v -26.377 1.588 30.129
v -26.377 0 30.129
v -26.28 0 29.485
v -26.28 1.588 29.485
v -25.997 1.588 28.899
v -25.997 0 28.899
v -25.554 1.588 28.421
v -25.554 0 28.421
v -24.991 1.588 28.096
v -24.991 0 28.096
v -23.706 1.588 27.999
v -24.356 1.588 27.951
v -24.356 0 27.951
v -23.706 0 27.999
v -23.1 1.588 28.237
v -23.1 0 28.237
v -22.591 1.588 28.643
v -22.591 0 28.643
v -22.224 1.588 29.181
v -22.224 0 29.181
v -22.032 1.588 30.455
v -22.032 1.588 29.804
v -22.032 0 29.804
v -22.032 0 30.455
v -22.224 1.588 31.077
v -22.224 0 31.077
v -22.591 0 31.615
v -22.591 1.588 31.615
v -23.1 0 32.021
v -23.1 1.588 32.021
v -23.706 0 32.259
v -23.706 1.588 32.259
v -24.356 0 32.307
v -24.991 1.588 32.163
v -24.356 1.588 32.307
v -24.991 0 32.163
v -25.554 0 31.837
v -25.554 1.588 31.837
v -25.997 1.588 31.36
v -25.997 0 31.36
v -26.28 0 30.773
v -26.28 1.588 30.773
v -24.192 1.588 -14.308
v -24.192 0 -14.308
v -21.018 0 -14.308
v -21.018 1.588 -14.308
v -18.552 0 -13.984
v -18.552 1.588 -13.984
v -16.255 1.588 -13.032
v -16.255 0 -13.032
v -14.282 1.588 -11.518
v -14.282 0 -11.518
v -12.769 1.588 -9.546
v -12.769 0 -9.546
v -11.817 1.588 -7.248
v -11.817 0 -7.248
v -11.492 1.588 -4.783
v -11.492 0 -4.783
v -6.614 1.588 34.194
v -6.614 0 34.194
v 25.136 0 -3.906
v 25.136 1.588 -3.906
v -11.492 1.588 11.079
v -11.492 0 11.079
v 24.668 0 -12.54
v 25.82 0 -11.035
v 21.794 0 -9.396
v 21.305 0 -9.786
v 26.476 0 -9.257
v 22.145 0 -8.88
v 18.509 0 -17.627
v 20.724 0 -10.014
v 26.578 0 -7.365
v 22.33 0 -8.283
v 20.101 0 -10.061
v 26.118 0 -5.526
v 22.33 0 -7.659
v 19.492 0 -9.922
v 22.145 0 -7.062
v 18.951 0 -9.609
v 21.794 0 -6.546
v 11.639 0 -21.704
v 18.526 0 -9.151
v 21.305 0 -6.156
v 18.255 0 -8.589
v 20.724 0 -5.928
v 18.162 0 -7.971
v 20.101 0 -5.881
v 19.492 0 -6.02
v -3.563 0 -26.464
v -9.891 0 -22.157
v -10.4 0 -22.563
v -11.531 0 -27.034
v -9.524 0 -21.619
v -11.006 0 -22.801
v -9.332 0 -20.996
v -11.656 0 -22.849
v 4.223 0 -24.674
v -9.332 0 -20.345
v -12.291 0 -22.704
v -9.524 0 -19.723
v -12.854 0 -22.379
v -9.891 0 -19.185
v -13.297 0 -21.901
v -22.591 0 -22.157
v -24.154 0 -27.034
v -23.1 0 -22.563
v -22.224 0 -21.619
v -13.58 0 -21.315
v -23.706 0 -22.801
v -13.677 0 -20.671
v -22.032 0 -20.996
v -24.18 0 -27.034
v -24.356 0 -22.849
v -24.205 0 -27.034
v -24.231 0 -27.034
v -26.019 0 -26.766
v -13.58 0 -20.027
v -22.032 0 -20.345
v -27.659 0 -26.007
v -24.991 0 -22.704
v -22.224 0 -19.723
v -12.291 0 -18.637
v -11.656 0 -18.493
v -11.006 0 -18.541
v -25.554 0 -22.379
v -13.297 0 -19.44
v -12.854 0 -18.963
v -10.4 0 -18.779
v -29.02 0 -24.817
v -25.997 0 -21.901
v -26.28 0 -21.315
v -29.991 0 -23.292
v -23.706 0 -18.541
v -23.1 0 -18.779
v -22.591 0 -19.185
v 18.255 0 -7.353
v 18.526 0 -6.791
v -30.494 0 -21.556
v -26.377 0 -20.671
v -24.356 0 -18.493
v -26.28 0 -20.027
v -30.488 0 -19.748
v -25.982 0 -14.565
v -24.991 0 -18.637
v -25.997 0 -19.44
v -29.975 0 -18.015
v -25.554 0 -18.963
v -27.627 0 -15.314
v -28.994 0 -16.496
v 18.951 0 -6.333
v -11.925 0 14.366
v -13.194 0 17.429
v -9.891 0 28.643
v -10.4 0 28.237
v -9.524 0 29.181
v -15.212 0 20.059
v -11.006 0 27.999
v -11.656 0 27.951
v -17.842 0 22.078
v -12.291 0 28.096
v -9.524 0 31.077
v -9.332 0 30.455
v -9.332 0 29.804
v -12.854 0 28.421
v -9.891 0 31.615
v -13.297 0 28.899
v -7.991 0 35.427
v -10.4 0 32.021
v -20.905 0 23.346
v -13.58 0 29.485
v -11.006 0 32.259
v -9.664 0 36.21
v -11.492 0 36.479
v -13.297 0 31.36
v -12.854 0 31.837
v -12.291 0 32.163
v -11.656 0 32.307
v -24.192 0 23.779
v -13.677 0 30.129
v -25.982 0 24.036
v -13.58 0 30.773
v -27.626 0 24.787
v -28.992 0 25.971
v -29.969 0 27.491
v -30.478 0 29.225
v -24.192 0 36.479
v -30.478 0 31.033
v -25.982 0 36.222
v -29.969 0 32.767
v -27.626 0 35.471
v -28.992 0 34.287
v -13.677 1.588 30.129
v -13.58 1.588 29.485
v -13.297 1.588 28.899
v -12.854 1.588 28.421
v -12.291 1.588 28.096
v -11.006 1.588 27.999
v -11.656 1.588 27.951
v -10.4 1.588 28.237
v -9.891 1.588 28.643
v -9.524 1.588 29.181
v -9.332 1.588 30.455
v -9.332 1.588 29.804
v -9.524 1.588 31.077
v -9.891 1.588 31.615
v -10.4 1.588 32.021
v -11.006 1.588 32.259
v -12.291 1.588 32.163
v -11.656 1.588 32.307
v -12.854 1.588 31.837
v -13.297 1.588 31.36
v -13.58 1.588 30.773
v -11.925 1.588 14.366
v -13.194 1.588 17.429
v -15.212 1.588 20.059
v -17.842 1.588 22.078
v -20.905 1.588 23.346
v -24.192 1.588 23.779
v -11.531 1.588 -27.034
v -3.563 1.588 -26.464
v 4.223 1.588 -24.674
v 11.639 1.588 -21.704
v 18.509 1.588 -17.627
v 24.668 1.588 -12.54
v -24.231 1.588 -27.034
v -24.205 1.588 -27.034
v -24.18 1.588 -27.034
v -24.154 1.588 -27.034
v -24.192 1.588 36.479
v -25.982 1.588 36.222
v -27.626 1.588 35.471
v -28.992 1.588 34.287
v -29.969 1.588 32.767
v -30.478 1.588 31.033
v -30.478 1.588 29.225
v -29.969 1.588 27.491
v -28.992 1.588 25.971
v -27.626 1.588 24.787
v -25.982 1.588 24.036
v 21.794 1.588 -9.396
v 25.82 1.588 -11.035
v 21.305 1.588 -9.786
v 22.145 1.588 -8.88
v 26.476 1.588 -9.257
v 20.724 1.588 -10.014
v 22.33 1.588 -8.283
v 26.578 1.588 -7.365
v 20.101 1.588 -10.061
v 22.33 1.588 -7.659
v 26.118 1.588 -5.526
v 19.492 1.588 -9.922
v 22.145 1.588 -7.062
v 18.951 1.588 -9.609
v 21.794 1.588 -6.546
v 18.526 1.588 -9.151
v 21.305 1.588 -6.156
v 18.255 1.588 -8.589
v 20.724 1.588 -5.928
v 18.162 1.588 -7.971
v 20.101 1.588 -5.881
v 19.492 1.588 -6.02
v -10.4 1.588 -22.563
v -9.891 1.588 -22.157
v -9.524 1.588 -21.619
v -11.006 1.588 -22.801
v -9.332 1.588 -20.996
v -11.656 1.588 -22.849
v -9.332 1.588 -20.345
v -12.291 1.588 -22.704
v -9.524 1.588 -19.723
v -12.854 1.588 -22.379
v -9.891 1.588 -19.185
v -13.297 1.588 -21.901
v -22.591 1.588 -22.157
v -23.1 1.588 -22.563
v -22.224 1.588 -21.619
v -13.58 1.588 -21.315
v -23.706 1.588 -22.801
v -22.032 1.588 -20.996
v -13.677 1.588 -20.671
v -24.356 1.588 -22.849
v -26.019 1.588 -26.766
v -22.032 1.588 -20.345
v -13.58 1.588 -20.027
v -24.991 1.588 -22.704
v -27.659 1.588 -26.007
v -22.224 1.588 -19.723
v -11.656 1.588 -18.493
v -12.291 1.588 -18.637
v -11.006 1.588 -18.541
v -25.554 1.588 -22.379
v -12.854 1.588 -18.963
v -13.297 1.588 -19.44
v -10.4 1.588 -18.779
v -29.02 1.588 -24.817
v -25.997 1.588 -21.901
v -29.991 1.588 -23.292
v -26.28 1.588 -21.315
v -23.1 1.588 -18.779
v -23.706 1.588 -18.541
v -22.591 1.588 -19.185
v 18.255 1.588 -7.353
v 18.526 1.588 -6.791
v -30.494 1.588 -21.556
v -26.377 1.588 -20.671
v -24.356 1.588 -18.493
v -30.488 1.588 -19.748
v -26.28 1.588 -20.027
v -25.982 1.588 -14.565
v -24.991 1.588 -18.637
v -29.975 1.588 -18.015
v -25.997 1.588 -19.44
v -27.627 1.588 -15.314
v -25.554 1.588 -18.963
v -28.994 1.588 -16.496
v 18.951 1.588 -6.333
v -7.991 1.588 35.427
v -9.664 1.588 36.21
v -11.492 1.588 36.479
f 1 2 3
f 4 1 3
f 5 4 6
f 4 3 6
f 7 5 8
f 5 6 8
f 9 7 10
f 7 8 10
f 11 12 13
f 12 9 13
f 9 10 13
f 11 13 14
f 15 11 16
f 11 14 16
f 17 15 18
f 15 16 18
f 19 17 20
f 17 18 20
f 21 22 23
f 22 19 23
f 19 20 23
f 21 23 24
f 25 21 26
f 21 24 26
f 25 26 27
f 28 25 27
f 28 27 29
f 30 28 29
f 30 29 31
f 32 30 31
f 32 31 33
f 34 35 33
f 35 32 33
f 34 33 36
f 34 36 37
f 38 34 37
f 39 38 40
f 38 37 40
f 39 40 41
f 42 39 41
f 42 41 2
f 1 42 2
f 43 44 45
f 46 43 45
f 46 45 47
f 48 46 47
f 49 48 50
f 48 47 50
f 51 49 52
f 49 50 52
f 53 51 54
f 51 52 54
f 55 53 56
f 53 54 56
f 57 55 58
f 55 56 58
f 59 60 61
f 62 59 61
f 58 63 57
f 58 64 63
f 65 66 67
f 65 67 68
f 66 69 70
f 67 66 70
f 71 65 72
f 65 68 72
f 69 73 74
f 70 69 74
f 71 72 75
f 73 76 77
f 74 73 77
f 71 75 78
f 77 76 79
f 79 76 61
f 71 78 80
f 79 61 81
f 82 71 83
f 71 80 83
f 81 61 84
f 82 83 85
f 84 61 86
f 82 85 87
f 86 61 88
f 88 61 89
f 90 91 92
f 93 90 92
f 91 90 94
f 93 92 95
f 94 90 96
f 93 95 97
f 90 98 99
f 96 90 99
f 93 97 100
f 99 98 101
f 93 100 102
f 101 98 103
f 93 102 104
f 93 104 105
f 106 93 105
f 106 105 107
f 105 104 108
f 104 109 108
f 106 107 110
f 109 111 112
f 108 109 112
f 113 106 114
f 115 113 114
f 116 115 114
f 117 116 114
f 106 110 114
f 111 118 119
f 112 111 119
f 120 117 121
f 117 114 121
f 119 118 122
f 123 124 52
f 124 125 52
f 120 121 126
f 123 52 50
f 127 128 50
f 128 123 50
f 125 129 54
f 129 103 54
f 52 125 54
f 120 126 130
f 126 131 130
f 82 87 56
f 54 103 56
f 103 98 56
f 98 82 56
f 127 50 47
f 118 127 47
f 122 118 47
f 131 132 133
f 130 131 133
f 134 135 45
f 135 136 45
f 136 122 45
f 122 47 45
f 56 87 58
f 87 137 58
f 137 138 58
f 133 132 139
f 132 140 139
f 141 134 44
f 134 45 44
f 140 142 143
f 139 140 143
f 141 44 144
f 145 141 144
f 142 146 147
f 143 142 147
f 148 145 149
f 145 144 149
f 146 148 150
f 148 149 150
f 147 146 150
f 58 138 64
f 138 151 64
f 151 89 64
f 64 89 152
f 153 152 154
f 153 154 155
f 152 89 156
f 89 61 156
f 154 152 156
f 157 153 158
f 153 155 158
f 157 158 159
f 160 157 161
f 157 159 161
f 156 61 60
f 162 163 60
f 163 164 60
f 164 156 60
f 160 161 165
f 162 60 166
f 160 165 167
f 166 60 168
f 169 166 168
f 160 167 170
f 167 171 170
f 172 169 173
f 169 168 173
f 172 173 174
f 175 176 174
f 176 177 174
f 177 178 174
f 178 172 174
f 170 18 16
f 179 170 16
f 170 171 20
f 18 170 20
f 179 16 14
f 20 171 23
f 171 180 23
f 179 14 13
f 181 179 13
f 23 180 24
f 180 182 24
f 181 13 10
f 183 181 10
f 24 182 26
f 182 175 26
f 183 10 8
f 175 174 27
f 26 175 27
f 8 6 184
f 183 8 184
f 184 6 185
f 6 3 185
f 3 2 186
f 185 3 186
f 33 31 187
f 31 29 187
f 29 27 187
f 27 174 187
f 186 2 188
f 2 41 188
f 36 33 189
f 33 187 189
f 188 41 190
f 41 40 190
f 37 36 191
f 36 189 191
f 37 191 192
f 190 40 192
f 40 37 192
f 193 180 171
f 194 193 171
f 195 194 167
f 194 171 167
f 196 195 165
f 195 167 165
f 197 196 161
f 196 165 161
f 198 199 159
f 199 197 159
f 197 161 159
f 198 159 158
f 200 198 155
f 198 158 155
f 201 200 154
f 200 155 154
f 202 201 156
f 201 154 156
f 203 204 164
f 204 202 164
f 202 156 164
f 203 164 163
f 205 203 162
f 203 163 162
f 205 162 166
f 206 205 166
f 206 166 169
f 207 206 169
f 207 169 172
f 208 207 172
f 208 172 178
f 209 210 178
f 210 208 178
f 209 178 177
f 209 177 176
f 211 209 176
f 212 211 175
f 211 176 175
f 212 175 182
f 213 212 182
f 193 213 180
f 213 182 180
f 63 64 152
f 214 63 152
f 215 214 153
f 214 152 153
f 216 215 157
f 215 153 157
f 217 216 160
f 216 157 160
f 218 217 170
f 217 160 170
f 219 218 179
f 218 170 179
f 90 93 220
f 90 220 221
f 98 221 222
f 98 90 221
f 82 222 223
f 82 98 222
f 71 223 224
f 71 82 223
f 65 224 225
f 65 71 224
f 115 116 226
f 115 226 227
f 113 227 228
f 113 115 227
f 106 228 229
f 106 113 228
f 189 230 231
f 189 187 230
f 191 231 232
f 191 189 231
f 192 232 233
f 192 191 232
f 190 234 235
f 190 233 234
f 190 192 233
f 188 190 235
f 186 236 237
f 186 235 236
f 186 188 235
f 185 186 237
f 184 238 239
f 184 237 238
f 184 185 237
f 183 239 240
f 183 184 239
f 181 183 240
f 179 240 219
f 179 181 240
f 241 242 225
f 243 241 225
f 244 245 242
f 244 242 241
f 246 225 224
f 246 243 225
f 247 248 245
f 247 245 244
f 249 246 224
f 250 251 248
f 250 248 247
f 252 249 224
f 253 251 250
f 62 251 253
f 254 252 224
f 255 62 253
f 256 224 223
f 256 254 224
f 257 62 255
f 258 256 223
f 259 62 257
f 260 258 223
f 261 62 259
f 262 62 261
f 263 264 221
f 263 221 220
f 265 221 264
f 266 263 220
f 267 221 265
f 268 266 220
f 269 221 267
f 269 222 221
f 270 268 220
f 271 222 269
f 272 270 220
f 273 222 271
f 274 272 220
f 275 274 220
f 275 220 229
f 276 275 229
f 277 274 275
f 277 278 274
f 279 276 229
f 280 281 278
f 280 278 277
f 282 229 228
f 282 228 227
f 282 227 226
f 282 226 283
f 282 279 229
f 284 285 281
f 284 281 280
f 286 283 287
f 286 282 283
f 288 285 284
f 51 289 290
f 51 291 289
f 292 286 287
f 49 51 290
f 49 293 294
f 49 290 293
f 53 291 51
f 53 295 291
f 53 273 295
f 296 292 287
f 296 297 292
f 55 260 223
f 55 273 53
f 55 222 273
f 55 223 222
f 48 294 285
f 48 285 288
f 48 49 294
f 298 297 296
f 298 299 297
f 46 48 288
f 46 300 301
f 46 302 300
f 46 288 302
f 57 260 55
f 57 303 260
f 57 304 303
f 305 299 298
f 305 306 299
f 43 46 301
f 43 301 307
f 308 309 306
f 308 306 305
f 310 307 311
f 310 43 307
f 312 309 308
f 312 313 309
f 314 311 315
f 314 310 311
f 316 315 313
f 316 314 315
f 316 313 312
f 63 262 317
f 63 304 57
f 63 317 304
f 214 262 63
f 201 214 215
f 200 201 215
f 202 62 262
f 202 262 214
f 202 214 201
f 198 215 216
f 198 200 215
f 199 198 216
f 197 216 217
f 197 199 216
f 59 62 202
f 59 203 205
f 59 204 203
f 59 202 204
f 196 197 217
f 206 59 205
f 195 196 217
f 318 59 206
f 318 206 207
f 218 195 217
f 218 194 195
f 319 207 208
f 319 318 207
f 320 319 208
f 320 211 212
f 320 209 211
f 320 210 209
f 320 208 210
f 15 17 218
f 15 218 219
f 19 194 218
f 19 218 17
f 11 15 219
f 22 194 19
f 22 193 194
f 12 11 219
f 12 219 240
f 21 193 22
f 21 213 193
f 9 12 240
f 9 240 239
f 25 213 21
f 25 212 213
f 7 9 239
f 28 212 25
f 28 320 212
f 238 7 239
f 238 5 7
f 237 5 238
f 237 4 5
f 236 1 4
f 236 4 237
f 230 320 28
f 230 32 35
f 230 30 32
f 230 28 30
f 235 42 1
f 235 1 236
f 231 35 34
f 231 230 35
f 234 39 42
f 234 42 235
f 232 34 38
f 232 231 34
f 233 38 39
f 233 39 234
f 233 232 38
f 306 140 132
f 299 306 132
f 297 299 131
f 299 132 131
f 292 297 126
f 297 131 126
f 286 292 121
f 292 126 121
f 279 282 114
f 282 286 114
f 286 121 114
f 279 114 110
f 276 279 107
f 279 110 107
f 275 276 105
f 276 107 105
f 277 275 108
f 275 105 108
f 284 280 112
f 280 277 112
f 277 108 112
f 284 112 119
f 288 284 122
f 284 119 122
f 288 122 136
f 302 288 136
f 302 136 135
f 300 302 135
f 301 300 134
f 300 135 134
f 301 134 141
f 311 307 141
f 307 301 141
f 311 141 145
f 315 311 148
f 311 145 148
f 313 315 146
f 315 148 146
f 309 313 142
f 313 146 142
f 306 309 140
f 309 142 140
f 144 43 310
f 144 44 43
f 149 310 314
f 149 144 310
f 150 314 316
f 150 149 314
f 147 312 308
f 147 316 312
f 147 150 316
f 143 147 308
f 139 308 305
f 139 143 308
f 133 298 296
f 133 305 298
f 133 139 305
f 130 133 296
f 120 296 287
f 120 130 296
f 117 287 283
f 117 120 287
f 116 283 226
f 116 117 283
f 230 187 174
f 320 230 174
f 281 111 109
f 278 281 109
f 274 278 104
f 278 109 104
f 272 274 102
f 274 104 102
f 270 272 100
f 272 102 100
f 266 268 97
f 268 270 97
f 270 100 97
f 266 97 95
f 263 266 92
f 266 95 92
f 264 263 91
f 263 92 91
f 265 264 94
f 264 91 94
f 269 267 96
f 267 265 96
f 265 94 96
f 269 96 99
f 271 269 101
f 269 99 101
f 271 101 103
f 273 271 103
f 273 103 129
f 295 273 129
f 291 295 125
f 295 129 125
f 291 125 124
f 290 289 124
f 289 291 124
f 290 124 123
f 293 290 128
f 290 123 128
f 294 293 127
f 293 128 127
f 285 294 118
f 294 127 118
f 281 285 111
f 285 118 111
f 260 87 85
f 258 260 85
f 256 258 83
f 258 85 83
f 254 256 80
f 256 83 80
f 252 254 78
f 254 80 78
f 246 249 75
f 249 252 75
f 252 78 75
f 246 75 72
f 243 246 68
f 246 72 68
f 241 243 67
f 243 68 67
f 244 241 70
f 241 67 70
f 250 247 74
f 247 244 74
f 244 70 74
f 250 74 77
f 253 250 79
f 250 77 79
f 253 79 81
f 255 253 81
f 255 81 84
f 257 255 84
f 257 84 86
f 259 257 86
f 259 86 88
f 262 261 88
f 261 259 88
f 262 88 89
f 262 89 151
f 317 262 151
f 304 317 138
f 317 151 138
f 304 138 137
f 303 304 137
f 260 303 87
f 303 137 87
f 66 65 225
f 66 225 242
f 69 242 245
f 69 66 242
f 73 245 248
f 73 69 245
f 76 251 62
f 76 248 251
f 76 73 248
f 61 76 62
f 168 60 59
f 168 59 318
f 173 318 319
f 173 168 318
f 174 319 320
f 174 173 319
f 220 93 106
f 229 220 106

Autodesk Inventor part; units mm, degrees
ref_plane "YZ Plane" through (0, 0, 0) normal (1, 0, 0) x (0, 1, 0)
ref_plane "XZ Plane" through (0, 0, 0) normal (0, 1, 0) x (-1, 0, 0)
ref_plane "XY Plane" through (0, 0, 0) normal (0, 0, 1) x (1, 0, 0)
sketch "main" plane through (0, 0, 0) normal (0, 0, 1) x (1, 0, 0)
  arc A0 (24.1925, 23.7791) -> (11.4925, 11.0791) centre (24.1925, 11.0791) ccw
  circle A1 centre (11.4925, 30.1291) radius 2.1844
  line L0 (24.1925, 23.7791) -> (24.1925, 23.7791)
  arc A2 (11.4925, 36.4791) -> (6.6143, 34.1942) centre (11.4925, 30.1291) ccw
  circle A3 centre (24.1925, 30.1291) radius 2.1844
  line L1 (24.1925, 36.4791) -> (11.4925, 36.4791)
  arc A4 (24.1925, 23.7791) -> (24.1925, 36.4791) centre (24.1925, 30.1291) ccw
  circle A5 centre (11.4925, -20.6709) radius 2.1844
  circle A6 centre (24.1925, -20.6709) radius 2.1844
  line L2 (24.1925, -14.3081) -> (21.0175, -14.3081)
  arc A7 (24.1539, -27.0337) -> (24.1925, -14.3081) centre (24.1925, -20.6709) ccw
  line L3 (11.4925, 11.0791) -> (11.4925, -4.7831)
  line L4 (6.6143, 34.1942) -> (-25.1357, -3.9059)
  arc A8 (11.4925, -4.7831) -> (21.0175, -14.3081) centre (21.0175, -4.7831) ccw
  circle A9 centre (-20.2575, -7.971) radius 2.0955
  arc A10 (-24.6678, -12.5396) -> (11.5311, -27.0337) centre (11.2178, 24.6342) ccw
  arc A11 (-25.1357, -3.9059) -> (-24.6678, -12.5396) centre (-20.2575, -7.971) ccw
  line L5 (11.5311, -27.0337) -> (24.2311, -27.0337)
  point P0 (10.6662, 5.6616)
  point P1 (11.4925, 23.7791)
  point P2 (11.4925, -14.3081)
  dimension "d0" = 12.7
  dimension "d1" = 12.7
  dimension "d2" = 9.525
sketch "Sketch1" plane through (0, 0, 0) normal (0, 1, 0) x (-1, 0, 0)
  arc A0 (24.1925, 23.7791) -> (11.4925, 11.0791) centre (24.1925, 11.0791) ccw
  circle A1 centre (11.4925, 30.1291) radius 2.1844
  line L0 (24.1925, 23.7791) -> (24.1925, 23.7791)
  arc A2 (11.4925, 36.4791) -> (6.6143, 34.1942) centre (11.4925, 30.1291) ccw
  circle A3 centre (24.1925, 30.1291) radius 2.1844
  line L1 (24.1925, 36.4791) -> (11.4925, 36.4791)
  arc A4 (24.1925, 23.7791) -> (24.1925, 36.4791) centre (24.1925, 30.1291) ccw
  circle A5 centre (11.4925, -20.6709) radius 2.1844
  circle A6 centre (24.1925, -20.6709) radius 2.1844
  line L2 (24.1925, -14.3081) -> (21.0175, -14.3081)
  arc A7 (24.1539, -27.0337) -> (24.1925, -14.3081) centre (24.1925, -20.6709) ccw
  line L3 (11.4925, 11.0791) -> (11.4925, -4.7831)
  line L4 (6.6143, 34.1942) -> (-25.1357, -3.9059)
  arc A8 (11.4925, -4.7831) -> (21.0175, -14.3081) centre (21.0175, -4.7831) ccw
  circle A9 centre (-20.2575, -7.971) radius 2.0955
  arc A10 (-24.6678, -12.5396) -> (11.5311, -27.0337) centre (11.2178, 24.6342) ccw
  arc A11 (-25.1357, -3.9059) -> (-24.6678, -12.5396) centre (-20.2575, -7.971) ccw
  line L5 (11.5311, -27.0337) -> (24.2311, -27.0337)
  point P0 (0, 0)
extrude "Extrusion1" add sketch "Sketch1" along normal blind 1.5875
equation "\"BendRadius\" = Thickness"
equation "\"BendReliefWidth\" = Thickness"
equation "\"BendReliefDepth\" = 0.5 * Thickness"
equation "\"CornerReliefSize\" = 4 * Thickness"
equation "\"MinimumRemnant\" = 2 * Thickness"
equation "\"TransitionRadius\" = BendRadius"
equation "\"JacobiRadiusSize\" = BendRadius"
equation "\"GapSize\" = Thickness"
equation "\"Thickness\" = 1.5875"
properties part number "gusset" material "Acetal Resin, White"
